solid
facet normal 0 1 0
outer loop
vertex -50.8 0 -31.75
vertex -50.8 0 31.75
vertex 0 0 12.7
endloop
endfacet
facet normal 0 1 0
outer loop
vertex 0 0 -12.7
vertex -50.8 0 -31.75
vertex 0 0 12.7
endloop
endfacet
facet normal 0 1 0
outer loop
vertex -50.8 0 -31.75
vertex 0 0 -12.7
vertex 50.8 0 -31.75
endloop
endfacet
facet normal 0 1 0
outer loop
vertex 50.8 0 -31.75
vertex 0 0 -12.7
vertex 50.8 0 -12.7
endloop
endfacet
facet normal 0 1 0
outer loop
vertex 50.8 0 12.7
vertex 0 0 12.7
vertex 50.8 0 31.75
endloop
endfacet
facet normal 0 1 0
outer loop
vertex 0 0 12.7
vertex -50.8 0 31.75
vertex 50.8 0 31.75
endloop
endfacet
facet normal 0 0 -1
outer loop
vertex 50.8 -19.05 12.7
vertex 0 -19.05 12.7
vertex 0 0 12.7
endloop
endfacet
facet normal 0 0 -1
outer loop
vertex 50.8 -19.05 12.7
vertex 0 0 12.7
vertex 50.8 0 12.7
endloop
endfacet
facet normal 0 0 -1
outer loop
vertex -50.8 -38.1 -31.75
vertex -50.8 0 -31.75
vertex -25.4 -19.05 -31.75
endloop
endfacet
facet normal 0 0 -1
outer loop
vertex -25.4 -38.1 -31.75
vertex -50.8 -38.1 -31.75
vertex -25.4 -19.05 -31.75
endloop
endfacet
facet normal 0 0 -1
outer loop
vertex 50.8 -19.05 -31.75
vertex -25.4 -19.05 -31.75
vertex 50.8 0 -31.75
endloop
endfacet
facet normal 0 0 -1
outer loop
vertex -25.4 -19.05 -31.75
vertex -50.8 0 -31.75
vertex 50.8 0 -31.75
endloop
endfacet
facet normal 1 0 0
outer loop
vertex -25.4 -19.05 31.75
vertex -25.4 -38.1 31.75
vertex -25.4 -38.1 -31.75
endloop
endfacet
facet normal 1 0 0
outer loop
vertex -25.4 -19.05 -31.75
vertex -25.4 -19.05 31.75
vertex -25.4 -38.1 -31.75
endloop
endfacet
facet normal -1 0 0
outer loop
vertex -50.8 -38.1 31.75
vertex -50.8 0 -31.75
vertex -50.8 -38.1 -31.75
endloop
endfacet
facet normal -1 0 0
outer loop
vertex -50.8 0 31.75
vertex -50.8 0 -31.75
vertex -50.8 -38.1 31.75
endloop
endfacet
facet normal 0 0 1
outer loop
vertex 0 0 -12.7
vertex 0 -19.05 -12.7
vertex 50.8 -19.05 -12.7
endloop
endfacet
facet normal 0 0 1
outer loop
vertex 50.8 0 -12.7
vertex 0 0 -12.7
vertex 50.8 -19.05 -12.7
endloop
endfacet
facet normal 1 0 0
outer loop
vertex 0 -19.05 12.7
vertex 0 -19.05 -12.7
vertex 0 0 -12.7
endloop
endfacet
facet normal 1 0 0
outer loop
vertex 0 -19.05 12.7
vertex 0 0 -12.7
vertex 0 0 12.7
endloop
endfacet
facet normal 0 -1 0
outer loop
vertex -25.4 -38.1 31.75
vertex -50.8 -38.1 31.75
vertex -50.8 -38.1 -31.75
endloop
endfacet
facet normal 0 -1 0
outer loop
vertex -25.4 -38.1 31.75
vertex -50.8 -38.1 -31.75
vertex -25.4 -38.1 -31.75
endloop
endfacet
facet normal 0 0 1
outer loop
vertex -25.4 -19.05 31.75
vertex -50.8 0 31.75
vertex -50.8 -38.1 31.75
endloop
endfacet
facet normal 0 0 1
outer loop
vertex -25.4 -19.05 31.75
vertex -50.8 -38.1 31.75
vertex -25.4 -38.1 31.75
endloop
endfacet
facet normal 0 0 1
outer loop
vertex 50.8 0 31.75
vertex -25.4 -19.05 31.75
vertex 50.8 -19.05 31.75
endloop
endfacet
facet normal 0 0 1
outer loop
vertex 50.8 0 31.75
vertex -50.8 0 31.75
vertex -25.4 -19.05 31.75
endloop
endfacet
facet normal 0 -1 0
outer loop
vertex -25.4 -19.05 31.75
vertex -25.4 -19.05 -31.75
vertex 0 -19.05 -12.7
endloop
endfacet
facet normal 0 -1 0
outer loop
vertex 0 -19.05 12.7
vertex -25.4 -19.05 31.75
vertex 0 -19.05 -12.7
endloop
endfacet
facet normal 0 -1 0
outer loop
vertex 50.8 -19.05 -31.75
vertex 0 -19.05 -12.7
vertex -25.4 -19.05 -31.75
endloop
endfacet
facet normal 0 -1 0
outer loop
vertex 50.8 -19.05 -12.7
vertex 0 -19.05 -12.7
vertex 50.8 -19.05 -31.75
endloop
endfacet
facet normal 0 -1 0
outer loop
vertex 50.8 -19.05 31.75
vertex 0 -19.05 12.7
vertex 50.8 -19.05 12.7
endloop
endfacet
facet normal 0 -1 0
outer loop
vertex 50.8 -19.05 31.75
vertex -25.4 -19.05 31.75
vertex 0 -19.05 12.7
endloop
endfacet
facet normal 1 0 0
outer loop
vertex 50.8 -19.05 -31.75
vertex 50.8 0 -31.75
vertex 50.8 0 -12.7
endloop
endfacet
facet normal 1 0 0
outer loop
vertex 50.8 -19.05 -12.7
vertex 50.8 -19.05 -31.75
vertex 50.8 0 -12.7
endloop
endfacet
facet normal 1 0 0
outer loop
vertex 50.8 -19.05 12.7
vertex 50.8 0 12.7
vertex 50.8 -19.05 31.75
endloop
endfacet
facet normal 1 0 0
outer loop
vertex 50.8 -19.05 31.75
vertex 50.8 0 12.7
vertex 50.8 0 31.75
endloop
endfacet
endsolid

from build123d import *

# Parameters (mm, degrees)
F0_W     = 101.6
F0_H     = 63.5
F1_DEPTH = 38.1
F2_W     = 50.8
F2_H     = 25.4
F3_DEPTH = 38.101
F4_DEPTH = 19.05


with BuildPart() as f1:
    # F0 (on Front) → F1 (new body)
    with BuildSketch(Plane.XZ):
        Rectangle(F0_W, F0_H)
    extrude(amount=F1_DEPTH)

    # F2 (on face) → F3 (cut, through all)
    with BuildSketch(Plane.XZ.offset(38.1)):
        with Locations((25.4, 0)):
            Rectangle(F2_W, F2_H)
    extrude(amount=-F3_DEPTH, mode=Mode.SUBTRACT)

    # F2 (on face) → F4 (cut)
    with BuildSketch(Plane.XZ.offset(38.1)):
        with Locations((25.4, 0)):
            Rectangle(F2_W, F2_H)
        Polygon((50.8, 31.75), (-25.4, 31.75), (-25.4, -31.75), (50.8, -31.75), (50.8, -12.7), (0, -12.7), (0, 12.7), (50.8, 12.7), align=None)
    extrude(amount=-F4_DEPTH, mode=Mode.SUBTRACT)


solid = f1.part
